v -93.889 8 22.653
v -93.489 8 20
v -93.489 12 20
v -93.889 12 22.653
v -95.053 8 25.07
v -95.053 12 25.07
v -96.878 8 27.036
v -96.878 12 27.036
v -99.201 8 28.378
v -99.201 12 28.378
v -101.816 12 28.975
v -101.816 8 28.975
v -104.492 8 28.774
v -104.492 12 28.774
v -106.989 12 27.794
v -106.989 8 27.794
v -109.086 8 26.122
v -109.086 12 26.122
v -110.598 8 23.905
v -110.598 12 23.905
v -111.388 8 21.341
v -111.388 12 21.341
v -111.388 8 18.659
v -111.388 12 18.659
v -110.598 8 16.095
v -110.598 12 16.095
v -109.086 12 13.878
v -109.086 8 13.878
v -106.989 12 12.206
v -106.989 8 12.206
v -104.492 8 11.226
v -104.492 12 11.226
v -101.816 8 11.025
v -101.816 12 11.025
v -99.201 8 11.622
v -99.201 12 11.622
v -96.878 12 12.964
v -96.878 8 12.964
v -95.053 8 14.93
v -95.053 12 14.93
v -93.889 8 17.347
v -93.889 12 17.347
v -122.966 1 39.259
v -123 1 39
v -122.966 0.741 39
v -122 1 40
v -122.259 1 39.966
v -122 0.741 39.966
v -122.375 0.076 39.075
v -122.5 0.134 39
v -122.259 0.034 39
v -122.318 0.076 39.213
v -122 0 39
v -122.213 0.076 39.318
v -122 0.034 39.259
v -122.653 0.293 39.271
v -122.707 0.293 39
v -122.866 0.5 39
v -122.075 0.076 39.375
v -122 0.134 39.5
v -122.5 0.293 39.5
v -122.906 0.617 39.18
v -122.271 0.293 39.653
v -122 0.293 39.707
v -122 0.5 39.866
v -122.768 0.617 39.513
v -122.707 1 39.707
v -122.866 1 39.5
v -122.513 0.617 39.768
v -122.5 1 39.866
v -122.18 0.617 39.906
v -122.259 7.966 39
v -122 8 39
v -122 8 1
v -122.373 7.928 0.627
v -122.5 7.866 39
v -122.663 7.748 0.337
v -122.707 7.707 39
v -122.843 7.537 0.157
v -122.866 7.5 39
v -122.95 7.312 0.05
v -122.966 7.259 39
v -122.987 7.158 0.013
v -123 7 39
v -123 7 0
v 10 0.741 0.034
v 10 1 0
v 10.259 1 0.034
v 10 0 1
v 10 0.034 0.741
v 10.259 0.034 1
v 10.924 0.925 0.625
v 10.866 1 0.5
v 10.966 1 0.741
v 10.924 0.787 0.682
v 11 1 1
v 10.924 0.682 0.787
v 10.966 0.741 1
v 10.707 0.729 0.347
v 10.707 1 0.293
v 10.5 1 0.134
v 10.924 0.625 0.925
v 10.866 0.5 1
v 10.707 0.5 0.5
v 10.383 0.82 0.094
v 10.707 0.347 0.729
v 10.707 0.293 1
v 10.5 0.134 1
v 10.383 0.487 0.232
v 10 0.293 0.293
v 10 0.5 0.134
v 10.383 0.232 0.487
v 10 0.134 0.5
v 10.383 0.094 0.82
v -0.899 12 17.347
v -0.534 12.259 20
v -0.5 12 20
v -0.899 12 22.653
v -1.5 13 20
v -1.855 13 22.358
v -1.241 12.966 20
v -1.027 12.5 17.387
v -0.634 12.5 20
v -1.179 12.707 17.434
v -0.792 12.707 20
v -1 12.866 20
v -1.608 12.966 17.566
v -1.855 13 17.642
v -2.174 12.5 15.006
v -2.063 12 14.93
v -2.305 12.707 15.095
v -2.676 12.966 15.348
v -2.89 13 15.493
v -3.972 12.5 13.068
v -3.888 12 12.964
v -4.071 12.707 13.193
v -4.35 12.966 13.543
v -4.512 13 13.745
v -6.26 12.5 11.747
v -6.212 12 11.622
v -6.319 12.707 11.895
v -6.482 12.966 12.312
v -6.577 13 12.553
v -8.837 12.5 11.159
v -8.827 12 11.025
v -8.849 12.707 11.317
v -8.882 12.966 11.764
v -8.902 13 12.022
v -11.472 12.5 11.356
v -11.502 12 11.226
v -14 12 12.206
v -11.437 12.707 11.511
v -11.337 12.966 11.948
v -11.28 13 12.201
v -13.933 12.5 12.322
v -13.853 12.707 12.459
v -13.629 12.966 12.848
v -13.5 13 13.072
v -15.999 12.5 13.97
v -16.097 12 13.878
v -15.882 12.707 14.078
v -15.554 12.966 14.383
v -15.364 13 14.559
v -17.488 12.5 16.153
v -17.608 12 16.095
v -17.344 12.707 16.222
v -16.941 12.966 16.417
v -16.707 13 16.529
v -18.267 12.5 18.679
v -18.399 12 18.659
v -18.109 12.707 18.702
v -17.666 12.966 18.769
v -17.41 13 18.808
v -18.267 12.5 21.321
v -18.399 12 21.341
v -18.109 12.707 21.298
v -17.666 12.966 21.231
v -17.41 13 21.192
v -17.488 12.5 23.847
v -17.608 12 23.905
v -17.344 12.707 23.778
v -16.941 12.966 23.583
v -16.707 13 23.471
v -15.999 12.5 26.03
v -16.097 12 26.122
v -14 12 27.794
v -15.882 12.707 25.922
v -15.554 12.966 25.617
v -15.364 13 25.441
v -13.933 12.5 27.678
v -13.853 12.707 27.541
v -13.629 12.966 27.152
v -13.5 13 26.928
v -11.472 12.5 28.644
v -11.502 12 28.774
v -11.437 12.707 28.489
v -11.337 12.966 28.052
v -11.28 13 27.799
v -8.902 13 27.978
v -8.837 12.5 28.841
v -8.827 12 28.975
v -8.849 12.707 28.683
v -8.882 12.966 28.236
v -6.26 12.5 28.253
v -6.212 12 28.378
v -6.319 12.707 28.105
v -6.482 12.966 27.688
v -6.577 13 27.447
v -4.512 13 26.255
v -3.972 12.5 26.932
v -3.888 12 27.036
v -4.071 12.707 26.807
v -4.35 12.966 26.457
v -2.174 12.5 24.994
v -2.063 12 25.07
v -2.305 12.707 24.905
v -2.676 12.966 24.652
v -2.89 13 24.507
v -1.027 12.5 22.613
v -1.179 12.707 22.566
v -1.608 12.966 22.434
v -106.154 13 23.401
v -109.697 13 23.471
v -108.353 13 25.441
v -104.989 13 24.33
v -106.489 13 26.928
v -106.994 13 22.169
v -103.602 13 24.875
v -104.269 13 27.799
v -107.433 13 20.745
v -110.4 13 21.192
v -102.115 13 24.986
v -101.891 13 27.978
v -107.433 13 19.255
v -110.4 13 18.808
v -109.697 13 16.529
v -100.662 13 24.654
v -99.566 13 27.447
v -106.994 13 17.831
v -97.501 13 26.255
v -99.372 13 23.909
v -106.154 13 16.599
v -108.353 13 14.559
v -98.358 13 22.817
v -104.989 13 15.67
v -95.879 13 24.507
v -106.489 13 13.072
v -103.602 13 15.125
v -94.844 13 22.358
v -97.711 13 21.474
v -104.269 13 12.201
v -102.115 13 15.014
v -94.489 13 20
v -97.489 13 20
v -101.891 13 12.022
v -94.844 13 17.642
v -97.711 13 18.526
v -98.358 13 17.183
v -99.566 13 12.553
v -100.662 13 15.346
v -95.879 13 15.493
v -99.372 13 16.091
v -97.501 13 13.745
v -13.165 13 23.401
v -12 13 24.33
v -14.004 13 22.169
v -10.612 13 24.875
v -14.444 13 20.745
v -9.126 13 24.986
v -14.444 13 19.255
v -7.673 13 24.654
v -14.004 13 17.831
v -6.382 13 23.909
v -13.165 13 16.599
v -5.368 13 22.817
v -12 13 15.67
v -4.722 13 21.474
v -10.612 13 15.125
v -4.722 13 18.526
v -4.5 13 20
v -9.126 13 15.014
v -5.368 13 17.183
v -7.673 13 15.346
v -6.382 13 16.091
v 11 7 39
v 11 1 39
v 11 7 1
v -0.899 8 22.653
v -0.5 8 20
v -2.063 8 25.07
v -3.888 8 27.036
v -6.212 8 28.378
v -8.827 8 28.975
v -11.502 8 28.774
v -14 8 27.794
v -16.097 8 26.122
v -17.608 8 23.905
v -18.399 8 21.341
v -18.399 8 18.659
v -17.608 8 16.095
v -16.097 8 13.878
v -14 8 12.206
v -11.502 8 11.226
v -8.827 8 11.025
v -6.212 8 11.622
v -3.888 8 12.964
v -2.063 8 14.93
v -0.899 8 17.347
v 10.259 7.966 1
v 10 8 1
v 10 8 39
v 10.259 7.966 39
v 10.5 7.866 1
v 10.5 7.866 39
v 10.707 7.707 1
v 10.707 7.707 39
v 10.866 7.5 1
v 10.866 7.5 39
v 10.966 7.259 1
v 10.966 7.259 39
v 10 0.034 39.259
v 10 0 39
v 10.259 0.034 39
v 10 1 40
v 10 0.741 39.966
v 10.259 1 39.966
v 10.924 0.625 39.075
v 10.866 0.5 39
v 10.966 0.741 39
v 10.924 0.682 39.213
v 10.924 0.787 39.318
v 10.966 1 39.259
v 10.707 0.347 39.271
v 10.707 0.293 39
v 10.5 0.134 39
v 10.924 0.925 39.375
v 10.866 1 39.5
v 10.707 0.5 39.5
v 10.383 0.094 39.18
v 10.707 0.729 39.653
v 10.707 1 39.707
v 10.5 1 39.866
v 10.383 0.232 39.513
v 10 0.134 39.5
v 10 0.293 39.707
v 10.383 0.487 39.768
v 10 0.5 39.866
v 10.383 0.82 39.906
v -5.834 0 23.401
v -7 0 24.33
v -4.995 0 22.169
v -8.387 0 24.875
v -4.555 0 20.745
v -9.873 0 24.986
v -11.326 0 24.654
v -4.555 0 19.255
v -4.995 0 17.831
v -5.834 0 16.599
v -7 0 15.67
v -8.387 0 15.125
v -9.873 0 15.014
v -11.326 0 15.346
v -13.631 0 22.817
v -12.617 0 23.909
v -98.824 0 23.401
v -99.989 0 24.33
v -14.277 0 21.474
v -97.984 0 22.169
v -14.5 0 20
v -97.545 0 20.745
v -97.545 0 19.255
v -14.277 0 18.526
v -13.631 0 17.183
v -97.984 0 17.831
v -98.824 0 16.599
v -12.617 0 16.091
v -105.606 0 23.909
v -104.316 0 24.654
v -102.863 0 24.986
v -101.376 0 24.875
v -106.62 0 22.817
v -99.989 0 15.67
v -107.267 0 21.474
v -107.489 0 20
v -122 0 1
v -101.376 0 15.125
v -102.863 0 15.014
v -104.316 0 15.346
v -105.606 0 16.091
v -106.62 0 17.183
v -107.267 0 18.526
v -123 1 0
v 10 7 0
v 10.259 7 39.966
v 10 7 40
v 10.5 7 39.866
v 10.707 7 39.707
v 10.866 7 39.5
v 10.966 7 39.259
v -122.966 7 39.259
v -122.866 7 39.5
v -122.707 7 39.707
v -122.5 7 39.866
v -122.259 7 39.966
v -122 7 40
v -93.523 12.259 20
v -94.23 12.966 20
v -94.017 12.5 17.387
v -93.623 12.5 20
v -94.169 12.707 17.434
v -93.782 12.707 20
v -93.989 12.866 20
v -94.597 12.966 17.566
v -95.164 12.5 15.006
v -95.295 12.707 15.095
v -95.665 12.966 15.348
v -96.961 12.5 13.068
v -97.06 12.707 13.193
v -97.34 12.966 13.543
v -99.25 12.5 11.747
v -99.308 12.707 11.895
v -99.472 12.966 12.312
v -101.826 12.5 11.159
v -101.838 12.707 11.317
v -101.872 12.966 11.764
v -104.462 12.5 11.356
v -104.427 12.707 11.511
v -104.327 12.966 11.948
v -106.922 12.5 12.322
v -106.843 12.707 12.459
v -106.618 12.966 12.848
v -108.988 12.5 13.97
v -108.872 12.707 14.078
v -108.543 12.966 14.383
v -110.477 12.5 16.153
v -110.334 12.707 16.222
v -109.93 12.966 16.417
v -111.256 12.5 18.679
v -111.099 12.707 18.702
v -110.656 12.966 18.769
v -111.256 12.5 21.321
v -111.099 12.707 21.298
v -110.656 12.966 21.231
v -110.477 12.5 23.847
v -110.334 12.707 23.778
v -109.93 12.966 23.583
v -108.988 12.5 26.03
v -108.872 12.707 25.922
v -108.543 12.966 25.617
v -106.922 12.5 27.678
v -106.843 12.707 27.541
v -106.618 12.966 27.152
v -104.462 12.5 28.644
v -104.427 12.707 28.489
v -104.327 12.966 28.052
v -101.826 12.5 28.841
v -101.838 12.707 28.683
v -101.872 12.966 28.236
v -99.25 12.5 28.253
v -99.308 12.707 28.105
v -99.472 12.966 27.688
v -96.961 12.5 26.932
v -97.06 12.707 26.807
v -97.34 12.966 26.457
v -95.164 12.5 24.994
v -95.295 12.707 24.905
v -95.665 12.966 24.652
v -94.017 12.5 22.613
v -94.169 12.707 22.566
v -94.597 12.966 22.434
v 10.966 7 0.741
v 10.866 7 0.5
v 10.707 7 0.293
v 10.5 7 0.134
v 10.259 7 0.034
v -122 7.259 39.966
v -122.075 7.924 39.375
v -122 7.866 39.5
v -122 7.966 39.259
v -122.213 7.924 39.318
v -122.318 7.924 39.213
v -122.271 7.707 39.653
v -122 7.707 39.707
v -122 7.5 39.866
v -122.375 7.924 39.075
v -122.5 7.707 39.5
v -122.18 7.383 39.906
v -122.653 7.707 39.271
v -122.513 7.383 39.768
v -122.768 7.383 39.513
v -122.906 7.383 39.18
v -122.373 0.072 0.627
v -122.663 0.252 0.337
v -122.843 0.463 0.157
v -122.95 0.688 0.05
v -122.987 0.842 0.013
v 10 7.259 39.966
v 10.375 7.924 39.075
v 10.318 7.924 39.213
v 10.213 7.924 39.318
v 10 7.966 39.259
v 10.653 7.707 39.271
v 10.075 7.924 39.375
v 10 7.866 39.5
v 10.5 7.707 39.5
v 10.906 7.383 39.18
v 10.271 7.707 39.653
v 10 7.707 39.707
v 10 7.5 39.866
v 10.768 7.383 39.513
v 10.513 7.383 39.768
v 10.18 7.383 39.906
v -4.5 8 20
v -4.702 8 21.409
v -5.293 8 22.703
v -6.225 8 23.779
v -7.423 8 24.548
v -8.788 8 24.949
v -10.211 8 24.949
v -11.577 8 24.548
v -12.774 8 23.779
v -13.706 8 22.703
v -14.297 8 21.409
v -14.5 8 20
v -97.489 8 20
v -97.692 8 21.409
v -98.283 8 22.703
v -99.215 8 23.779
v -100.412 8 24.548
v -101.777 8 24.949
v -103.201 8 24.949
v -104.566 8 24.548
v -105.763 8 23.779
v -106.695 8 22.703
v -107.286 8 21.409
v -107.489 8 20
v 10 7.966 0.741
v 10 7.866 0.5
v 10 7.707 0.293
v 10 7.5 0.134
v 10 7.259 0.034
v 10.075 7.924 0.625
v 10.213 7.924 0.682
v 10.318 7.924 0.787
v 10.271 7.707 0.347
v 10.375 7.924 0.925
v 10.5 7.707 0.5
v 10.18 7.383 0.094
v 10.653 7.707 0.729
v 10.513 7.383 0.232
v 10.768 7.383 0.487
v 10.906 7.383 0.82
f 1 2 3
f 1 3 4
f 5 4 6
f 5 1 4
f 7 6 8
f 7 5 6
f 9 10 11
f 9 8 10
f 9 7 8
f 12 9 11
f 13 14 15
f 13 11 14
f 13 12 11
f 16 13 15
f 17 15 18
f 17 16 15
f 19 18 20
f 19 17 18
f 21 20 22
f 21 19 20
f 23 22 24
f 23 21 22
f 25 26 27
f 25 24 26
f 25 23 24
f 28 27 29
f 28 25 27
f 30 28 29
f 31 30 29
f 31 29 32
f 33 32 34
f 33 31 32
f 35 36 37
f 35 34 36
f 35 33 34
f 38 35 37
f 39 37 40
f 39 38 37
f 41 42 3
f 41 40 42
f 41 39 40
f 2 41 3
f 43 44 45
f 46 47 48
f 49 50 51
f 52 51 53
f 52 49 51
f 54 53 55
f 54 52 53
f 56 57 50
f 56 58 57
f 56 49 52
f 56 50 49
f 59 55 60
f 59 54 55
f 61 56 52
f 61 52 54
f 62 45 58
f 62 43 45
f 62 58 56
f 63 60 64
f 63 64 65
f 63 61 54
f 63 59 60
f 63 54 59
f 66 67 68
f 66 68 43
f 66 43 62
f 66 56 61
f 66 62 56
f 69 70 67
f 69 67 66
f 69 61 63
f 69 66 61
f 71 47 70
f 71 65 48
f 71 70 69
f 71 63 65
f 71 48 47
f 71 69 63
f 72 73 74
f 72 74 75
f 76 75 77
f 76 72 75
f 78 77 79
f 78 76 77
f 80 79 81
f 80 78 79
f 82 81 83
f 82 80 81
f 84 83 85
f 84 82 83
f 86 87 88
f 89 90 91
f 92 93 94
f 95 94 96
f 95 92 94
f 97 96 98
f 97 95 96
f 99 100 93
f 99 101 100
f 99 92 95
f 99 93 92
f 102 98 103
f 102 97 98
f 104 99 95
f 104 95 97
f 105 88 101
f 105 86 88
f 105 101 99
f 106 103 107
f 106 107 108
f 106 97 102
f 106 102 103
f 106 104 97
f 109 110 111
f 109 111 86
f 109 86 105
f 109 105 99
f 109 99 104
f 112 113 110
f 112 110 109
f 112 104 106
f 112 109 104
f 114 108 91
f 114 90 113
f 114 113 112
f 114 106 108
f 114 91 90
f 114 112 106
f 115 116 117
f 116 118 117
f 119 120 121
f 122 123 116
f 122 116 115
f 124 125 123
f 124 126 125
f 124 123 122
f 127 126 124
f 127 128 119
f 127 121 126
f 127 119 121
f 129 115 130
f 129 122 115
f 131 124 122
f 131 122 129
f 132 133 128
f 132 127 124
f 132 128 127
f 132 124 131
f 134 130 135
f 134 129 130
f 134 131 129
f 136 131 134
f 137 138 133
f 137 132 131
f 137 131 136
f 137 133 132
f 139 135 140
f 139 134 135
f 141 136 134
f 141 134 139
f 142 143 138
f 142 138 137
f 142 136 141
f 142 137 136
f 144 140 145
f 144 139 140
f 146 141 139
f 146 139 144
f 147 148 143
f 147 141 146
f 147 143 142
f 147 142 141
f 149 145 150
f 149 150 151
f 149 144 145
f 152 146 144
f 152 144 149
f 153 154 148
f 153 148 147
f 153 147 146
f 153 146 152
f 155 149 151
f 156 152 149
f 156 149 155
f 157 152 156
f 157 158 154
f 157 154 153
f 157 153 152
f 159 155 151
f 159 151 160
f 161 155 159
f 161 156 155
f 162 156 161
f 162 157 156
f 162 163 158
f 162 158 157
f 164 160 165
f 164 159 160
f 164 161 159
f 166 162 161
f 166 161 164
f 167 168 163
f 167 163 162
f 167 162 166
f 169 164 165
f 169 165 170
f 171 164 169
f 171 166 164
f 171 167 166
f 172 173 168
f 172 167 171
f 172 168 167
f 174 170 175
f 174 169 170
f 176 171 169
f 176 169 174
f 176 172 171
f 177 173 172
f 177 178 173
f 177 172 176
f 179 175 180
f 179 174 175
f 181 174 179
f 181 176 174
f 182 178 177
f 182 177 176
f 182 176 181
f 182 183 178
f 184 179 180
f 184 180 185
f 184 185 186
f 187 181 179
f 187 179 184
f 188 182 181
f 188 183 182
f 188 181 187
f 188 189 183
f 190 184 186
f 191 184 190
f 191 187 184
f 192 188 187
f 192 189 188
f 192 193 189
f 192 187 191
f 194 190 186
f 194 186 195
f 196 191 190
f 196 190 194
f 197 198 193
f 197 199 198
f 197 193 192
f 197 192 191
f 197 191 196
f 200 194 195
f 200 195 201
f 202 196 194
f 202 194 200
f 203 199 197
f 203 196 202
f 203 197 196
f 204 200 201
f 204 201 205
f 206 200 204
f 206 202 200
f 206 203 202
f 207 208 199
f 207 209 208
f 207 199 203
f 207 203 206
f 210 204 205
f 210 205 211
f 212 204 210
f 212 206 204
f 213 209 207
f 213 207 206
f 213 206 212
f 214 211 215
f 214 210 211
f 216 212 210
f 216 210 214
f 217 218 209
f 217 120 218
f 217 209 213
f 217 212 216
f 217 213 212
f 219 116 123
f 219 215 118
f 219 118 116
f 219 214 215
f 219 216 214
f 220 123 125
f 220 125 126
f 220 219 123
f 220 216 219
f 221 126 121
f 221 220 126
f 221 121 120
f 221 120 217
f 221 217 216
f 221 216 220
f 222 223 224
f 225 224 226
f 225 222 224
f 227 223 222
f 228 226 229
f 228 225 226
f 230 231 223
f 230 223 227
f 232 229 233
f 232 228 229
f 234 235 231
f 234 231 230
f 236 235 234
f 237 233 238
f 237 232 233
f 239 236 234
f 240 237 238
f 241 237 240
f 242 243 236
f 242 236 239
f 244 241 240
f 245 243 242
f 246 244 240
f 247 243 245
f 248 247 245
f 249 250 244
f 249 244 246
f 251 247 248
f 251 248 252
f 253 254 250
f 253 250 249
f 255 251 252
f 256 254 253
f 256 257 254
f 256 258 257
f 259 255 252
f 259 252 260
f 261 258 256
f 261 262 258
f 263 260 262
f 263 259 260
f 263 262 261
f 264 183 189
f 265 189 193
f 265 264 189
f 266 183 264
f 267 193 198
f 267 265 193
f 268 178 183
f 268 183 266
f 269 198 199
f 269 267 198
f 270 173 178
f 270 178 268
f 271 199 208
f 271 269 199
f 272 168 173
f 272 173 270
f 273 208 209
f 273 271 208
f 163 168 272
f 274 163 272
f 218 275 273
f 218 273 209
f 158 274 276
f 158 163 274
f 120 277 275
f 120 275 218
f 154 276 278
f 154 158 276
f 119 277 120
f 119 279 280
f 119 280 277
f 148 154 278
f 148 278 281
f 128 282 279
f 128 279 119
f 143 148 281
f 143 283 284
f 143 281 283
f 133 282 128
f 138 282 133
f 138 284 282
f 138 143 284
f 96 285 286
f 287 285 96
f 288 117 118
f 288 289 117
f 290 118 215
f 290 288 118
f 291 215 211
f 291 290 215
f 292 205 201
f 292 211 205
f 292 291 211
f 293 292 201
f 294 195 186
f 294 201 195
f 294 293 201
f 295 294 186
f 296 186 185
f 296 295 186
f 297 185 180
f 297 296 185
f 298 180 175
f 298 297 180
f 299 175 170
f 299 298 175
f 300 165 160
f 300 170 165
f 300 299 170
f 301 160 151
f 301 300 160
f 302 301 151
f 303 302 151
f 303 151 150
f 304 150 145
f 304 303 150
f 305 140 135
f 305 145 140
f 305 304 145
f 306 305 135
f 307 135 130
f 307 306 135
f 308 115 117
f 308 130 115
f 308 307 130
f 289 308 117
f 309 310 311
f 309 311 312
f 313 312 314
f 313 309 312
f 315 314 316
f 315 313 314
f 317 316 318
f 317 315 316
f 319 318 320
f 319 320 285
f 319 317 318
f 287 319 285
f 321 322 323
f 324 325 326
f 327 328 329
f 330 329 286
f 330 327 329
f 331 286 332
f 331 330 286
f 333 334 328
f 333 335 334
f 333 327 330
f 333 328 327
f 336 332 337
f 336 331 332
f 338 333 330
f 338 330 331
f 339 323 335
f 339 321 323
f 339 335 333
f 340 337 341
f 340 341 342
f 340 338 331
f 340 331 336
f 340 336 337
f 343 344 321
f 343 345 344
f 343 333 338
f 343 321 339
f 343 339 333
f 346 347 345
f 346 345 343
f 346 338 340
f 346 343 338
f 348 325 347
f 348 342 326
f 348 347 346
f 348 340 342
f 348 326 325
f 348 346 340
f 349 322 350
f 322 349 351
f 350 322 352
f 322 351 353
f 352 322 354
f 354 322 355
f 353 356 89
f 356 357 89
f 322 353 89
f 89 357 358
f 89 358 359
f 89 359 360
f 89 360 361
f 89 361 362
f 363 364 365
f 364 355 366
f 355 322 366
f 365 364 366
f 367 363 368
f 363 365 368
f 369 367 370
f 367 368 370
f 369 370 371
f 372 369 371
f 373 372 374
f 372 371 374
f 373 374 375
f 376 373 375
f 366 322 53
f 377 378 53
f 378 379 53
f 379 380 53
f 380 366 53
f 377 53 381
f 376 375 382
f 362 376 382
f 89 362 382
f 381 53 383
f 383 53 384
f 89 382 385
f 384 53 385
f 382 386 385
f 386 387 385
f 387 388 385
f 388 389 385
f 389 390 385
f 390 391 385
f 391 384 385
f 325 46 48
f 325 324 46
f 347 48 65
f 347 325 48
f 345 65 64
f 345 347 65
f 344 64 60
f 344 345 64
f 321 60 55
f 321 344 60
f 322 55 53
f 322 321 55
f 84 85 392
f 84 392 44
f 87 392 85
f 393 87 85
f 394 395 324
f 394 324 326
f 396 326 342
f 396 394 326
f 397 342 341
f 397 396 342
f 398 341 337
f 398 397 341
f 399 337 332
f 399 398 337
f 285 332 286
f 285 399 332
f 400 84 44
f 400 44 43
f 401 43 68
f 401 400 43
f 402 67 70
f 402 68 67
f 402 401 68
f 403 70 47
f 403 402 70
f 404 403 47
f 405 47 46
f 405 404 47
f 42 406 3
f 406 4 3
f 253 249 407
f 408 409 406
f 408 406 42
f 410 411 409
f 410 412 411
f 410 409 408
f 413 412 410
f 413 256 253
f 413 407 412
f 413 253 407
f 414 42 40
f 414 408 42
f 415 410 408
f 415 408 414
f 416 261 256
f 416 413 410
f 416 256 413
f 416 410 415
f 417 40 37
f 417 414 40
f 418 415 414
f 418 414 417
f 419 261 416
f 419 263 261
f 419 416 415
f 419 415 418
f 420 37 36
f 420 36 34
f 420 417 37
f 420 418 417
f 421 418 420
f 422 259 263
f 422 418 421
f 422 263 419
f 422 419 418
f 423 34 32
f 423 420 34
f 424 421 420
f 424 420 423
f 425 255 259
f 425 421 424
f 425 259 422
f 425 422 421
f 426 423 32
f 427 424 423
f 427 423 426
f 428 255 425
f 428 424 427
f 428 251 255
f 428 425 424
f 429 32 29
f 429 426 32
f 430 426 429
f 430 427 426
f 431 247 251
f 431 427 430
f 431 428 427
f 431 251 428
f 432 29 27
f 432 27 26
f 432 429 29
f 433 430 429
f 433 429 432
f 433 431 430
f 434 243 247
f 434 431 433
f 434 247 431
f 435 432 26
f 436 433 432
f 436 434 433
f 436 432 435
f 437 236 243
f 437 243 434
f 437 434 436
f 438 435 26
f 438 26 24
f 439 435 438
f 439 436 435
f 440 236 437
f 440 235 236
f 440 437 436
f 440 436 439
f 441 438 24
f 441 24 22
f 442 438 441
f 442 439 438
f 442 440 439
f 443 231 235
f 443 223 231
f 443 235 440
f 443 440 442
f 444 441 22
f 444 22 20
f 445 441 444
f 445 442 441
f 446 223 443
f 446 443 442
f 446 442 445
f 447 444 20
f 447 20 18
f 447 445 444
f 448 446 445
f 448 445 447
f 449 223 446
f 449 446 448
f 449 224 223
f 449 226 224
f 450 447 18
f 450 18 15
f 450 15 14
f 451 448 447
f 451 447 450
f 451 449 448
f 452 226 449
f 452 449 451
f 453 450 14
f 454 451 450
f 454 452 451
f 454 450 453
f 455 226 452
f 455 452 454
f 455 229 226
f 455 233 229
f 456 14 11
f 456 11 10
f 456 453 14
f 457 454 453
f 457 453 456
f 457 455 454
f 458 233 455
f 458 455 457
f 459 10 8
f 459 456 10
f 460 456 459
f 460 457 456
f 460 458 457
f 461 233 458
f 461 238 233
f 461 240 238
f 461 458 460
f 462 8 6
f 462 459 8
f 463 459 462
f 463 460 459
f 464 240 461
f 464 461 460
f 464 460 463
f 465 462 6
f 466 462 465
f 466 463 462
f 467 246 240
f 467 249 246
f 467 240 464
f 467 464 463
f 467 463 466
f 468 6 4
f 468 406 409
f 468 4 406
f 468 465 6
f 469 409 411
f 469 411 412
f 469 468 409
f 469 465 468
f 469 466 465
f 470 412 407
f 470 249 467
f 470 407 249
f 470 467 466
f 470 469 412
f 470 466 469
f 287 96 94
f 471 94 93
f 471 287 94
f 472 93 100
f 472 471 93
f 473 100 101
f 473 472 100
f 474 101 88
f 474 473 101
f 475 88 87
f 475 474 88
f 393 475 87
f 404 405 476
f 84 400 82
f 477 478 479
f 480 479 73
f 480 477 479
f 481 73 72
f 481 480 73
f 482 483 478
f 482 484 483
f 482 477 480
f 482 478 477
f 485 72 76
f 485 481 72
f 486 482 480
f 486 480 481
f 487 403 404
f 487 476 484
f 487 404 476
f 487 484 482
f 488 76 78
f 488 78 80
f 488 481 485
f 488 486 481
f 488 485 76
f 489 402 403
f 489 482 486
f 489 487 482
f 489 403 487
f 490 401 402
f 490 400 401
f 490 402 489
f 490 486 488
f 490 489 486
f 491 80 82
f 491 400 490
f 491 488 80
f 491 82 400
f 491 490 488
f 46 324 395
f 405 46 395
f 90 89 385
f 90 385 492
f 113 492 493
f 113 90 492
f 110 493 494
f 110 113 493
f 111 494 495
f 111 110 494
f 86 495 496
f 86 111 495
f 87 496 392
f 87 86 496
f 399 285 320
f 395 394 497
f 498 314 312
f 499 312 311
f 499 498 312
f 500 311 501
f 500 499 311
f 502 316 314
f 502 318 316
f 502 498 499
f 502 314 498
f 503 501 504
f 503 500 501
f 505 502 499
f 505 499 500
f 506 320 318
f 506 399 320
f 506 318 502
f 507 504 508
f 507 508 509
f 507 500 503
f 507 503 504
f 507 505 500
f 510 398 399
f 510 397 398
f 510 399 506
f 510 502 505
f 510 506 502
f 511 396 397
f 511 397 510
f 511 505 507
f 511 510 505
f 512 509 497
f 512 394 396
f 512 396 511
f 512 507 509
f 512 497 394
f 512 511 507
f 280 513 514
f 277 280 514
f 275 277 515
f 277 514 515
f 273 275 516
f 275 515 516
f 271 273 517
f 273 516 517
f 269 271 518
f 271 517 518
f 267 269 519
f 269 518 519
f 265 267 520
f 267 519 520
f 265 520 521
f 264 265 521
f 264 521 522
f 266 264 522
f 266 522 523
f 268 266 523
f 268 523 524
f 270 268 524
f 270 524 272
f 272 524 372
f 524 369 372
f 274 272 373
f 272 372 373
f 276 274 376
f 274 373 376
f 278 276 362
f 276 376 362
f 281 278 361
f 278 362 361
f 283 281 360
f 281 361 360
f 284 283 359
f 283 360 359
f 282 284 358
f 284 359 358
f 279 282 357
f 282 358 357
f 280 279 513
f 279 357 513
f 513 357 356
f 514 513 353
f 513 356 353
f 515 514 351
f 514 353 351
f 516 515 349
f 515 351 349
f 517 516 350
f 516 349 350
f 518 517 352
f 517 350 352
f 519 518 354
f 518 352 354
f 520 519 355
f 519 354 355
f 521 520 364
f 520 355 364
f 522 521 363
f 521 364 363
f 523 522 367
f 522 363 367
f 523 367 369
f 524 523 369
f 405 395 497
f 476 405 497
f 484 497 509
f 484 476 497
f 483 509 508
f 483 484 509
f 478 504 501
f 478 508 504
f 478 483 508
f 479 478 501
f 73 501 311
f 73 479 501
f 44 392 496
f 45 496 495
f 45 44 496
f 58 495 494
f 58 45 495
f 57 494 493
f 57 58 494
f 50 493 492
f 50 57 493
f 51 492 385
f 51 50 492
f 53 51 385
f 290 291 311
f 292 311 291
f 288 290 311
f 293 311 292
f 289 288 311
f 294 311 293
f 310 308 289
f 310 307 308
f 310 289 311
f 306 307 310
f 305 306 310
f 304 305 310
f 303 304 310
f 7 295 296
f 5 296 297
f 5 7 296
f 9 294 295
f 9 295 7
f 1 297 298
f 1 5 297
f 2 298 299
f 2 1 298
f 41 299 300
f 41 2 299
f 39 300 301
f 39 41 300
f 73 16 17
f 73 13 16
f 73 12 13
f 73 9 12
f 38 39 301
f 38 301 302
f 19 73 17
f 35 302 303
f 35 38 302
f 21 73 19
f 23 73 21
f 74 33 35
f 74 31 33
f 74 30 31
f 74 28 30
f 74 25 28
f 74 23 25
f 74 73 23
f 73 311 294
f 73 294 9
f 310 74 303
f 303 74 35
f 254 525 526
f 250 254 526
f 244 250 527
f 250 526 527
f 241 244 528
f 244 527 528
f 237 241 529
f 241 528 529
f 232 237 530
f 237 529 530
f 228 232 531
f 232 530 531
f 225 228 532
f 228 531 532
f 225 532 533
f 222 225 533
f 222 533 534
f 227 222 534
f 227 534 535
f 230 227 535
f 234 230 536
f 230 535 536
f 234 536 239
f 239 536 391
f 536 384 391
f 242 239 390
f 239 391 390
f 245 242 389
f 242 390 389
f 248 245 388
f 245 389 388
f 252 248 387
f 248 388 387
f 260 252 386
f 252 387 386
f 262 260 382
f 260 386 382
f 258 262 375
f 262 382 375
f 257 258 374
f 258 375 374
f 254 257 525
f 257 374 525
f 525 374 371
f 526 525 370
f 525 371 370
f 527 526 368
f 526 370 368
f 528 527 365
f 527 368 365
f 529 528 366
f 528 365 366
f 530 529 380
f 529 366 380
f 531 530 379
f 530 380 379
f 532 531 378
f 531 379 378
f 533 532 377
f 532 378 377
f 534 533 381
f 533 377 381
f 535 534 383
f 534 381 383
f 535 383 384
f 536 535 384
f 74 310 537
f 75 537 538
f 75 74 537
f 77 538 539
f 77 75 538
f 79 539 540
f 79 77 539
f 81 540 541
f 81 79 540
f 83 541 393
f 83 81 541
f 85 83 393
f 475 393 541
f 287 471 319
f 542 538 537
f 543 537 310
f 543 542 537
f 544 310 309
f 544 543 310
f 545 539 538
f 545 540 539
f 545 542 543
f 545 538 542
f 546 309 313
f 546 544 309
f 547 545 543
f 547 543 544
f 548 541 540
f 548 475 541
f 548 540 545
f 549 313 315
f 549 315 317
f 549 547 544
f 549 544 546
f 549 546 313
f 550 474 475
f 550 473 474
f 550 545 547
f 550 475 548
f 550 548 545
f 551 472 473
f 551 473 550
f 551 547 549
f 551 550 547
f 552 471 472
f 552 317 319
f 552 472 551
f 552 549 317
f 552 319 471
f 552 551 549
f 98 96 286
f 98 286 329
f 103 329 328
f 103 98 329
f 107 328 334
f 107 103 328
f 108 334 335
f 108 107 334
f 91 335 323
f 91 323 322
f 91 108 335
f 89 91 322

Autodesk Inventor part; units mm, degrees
ref_plane "YZ Plane" through (0, 0, 0) normal (1, 0, 0) x (0, 1, 0)
ref_plane "XZ Plane" through (0, 0, 0) normal (0, 1, 0) x (-1, 0, 0)
ref_plane "XY Plane" through (0, 0, 0) normal (0, 0, 1) x (1, 0, 0)
sketch "Sketch1" plane through (0, 0, 0) normal (0, 1, 0) x (-1, 0, 0)
  line L0 (0, 0) -> (112, 0)
  line L1 (112, 0) -> (112, 40)
  line L2 (112, 40) -> (0, 40)
  line L3 (0, 40) -> (0, 0)
  circle A0 centre (9.4996, 20) radius 5
  circle A1 centre (102.489, 20) radius 5
  dimension "d0" = 112
  dimension "d1" = 40
  dimension "d4" = 10
  dimension "d5" = 10
  dimension "d18" = 92.9894
  dimension "d19" = 9.4996
  dimension "d22" = 9.511
  dimension "d23" = 40
  dimension "d24" = 20
extrude "Extrusion1" add sketch "Sketch1" along normal blind 8
sketch "Sketch2" plane through (0, 8, 0) normal (0, 1, 0) x (1, 0, 0)
  circle A0 centre (-102.489, -20) radius 5 projected
  circle A1 centre (-9.4996, -20) radius 5 projected
  circle A2 centre (-102.489, -20) radius 9
  circle A3 centre (-9.4996, -20) radius 9
  dimension "d8" = 18
  dimension "d9" = 18
extrude "Extrusion2" add sketch "Sketch2" along normal blind 5
sketch "Sketch3" plane through (-112, 0, 0) normal (-1, 0, 0) x (0, 0, 1)
  line L0 (0, 0) -> (40, 0) projected
  line L1 (40, 0) -> (40, 8) projected
  line L2 (0, 8) -> (40, 8) projected
  line L3 (0, 0) -> (0, 8) projected
extrude "Extrusion3" add sketch "Sketch3" along normal blind 11
sketch "Sketch4" plane through (0, 0, 40) normal (1, 0, 0) x (0, 0, -1)
  line L0 (0, 0) -> (40, 0) projected
  line L1 (40, 0) -> (40, 8) projected
  line L2 (0, 8) -> (40, 8) projected
  line L3 (0, 0) -> (0, 8) projected
extrude "Extrusion4" add sketch "Sketch4" along normal blind 11
fillet "Fillet1" radius 1 13 edges at (-123, 4, 40) (-56, 0, 40) (-56, 0, 0) (-123, 0, 20) (11, 0, 20) (11, 4, 40) (11, 4, 0) (-56, 8, 0) (11, 8, 20) (-56, 8, 40) (-123, 8, 20) (-111.489, 13, 20) (-18.4996, 13, 20)
equation "\"d5\" = d4"
equation "\"d24\" = 0.5 * d23"
equation "\"d9\" = d8"
properties part number "CIM MountBase" material "Aluminum 6061, Welded"
